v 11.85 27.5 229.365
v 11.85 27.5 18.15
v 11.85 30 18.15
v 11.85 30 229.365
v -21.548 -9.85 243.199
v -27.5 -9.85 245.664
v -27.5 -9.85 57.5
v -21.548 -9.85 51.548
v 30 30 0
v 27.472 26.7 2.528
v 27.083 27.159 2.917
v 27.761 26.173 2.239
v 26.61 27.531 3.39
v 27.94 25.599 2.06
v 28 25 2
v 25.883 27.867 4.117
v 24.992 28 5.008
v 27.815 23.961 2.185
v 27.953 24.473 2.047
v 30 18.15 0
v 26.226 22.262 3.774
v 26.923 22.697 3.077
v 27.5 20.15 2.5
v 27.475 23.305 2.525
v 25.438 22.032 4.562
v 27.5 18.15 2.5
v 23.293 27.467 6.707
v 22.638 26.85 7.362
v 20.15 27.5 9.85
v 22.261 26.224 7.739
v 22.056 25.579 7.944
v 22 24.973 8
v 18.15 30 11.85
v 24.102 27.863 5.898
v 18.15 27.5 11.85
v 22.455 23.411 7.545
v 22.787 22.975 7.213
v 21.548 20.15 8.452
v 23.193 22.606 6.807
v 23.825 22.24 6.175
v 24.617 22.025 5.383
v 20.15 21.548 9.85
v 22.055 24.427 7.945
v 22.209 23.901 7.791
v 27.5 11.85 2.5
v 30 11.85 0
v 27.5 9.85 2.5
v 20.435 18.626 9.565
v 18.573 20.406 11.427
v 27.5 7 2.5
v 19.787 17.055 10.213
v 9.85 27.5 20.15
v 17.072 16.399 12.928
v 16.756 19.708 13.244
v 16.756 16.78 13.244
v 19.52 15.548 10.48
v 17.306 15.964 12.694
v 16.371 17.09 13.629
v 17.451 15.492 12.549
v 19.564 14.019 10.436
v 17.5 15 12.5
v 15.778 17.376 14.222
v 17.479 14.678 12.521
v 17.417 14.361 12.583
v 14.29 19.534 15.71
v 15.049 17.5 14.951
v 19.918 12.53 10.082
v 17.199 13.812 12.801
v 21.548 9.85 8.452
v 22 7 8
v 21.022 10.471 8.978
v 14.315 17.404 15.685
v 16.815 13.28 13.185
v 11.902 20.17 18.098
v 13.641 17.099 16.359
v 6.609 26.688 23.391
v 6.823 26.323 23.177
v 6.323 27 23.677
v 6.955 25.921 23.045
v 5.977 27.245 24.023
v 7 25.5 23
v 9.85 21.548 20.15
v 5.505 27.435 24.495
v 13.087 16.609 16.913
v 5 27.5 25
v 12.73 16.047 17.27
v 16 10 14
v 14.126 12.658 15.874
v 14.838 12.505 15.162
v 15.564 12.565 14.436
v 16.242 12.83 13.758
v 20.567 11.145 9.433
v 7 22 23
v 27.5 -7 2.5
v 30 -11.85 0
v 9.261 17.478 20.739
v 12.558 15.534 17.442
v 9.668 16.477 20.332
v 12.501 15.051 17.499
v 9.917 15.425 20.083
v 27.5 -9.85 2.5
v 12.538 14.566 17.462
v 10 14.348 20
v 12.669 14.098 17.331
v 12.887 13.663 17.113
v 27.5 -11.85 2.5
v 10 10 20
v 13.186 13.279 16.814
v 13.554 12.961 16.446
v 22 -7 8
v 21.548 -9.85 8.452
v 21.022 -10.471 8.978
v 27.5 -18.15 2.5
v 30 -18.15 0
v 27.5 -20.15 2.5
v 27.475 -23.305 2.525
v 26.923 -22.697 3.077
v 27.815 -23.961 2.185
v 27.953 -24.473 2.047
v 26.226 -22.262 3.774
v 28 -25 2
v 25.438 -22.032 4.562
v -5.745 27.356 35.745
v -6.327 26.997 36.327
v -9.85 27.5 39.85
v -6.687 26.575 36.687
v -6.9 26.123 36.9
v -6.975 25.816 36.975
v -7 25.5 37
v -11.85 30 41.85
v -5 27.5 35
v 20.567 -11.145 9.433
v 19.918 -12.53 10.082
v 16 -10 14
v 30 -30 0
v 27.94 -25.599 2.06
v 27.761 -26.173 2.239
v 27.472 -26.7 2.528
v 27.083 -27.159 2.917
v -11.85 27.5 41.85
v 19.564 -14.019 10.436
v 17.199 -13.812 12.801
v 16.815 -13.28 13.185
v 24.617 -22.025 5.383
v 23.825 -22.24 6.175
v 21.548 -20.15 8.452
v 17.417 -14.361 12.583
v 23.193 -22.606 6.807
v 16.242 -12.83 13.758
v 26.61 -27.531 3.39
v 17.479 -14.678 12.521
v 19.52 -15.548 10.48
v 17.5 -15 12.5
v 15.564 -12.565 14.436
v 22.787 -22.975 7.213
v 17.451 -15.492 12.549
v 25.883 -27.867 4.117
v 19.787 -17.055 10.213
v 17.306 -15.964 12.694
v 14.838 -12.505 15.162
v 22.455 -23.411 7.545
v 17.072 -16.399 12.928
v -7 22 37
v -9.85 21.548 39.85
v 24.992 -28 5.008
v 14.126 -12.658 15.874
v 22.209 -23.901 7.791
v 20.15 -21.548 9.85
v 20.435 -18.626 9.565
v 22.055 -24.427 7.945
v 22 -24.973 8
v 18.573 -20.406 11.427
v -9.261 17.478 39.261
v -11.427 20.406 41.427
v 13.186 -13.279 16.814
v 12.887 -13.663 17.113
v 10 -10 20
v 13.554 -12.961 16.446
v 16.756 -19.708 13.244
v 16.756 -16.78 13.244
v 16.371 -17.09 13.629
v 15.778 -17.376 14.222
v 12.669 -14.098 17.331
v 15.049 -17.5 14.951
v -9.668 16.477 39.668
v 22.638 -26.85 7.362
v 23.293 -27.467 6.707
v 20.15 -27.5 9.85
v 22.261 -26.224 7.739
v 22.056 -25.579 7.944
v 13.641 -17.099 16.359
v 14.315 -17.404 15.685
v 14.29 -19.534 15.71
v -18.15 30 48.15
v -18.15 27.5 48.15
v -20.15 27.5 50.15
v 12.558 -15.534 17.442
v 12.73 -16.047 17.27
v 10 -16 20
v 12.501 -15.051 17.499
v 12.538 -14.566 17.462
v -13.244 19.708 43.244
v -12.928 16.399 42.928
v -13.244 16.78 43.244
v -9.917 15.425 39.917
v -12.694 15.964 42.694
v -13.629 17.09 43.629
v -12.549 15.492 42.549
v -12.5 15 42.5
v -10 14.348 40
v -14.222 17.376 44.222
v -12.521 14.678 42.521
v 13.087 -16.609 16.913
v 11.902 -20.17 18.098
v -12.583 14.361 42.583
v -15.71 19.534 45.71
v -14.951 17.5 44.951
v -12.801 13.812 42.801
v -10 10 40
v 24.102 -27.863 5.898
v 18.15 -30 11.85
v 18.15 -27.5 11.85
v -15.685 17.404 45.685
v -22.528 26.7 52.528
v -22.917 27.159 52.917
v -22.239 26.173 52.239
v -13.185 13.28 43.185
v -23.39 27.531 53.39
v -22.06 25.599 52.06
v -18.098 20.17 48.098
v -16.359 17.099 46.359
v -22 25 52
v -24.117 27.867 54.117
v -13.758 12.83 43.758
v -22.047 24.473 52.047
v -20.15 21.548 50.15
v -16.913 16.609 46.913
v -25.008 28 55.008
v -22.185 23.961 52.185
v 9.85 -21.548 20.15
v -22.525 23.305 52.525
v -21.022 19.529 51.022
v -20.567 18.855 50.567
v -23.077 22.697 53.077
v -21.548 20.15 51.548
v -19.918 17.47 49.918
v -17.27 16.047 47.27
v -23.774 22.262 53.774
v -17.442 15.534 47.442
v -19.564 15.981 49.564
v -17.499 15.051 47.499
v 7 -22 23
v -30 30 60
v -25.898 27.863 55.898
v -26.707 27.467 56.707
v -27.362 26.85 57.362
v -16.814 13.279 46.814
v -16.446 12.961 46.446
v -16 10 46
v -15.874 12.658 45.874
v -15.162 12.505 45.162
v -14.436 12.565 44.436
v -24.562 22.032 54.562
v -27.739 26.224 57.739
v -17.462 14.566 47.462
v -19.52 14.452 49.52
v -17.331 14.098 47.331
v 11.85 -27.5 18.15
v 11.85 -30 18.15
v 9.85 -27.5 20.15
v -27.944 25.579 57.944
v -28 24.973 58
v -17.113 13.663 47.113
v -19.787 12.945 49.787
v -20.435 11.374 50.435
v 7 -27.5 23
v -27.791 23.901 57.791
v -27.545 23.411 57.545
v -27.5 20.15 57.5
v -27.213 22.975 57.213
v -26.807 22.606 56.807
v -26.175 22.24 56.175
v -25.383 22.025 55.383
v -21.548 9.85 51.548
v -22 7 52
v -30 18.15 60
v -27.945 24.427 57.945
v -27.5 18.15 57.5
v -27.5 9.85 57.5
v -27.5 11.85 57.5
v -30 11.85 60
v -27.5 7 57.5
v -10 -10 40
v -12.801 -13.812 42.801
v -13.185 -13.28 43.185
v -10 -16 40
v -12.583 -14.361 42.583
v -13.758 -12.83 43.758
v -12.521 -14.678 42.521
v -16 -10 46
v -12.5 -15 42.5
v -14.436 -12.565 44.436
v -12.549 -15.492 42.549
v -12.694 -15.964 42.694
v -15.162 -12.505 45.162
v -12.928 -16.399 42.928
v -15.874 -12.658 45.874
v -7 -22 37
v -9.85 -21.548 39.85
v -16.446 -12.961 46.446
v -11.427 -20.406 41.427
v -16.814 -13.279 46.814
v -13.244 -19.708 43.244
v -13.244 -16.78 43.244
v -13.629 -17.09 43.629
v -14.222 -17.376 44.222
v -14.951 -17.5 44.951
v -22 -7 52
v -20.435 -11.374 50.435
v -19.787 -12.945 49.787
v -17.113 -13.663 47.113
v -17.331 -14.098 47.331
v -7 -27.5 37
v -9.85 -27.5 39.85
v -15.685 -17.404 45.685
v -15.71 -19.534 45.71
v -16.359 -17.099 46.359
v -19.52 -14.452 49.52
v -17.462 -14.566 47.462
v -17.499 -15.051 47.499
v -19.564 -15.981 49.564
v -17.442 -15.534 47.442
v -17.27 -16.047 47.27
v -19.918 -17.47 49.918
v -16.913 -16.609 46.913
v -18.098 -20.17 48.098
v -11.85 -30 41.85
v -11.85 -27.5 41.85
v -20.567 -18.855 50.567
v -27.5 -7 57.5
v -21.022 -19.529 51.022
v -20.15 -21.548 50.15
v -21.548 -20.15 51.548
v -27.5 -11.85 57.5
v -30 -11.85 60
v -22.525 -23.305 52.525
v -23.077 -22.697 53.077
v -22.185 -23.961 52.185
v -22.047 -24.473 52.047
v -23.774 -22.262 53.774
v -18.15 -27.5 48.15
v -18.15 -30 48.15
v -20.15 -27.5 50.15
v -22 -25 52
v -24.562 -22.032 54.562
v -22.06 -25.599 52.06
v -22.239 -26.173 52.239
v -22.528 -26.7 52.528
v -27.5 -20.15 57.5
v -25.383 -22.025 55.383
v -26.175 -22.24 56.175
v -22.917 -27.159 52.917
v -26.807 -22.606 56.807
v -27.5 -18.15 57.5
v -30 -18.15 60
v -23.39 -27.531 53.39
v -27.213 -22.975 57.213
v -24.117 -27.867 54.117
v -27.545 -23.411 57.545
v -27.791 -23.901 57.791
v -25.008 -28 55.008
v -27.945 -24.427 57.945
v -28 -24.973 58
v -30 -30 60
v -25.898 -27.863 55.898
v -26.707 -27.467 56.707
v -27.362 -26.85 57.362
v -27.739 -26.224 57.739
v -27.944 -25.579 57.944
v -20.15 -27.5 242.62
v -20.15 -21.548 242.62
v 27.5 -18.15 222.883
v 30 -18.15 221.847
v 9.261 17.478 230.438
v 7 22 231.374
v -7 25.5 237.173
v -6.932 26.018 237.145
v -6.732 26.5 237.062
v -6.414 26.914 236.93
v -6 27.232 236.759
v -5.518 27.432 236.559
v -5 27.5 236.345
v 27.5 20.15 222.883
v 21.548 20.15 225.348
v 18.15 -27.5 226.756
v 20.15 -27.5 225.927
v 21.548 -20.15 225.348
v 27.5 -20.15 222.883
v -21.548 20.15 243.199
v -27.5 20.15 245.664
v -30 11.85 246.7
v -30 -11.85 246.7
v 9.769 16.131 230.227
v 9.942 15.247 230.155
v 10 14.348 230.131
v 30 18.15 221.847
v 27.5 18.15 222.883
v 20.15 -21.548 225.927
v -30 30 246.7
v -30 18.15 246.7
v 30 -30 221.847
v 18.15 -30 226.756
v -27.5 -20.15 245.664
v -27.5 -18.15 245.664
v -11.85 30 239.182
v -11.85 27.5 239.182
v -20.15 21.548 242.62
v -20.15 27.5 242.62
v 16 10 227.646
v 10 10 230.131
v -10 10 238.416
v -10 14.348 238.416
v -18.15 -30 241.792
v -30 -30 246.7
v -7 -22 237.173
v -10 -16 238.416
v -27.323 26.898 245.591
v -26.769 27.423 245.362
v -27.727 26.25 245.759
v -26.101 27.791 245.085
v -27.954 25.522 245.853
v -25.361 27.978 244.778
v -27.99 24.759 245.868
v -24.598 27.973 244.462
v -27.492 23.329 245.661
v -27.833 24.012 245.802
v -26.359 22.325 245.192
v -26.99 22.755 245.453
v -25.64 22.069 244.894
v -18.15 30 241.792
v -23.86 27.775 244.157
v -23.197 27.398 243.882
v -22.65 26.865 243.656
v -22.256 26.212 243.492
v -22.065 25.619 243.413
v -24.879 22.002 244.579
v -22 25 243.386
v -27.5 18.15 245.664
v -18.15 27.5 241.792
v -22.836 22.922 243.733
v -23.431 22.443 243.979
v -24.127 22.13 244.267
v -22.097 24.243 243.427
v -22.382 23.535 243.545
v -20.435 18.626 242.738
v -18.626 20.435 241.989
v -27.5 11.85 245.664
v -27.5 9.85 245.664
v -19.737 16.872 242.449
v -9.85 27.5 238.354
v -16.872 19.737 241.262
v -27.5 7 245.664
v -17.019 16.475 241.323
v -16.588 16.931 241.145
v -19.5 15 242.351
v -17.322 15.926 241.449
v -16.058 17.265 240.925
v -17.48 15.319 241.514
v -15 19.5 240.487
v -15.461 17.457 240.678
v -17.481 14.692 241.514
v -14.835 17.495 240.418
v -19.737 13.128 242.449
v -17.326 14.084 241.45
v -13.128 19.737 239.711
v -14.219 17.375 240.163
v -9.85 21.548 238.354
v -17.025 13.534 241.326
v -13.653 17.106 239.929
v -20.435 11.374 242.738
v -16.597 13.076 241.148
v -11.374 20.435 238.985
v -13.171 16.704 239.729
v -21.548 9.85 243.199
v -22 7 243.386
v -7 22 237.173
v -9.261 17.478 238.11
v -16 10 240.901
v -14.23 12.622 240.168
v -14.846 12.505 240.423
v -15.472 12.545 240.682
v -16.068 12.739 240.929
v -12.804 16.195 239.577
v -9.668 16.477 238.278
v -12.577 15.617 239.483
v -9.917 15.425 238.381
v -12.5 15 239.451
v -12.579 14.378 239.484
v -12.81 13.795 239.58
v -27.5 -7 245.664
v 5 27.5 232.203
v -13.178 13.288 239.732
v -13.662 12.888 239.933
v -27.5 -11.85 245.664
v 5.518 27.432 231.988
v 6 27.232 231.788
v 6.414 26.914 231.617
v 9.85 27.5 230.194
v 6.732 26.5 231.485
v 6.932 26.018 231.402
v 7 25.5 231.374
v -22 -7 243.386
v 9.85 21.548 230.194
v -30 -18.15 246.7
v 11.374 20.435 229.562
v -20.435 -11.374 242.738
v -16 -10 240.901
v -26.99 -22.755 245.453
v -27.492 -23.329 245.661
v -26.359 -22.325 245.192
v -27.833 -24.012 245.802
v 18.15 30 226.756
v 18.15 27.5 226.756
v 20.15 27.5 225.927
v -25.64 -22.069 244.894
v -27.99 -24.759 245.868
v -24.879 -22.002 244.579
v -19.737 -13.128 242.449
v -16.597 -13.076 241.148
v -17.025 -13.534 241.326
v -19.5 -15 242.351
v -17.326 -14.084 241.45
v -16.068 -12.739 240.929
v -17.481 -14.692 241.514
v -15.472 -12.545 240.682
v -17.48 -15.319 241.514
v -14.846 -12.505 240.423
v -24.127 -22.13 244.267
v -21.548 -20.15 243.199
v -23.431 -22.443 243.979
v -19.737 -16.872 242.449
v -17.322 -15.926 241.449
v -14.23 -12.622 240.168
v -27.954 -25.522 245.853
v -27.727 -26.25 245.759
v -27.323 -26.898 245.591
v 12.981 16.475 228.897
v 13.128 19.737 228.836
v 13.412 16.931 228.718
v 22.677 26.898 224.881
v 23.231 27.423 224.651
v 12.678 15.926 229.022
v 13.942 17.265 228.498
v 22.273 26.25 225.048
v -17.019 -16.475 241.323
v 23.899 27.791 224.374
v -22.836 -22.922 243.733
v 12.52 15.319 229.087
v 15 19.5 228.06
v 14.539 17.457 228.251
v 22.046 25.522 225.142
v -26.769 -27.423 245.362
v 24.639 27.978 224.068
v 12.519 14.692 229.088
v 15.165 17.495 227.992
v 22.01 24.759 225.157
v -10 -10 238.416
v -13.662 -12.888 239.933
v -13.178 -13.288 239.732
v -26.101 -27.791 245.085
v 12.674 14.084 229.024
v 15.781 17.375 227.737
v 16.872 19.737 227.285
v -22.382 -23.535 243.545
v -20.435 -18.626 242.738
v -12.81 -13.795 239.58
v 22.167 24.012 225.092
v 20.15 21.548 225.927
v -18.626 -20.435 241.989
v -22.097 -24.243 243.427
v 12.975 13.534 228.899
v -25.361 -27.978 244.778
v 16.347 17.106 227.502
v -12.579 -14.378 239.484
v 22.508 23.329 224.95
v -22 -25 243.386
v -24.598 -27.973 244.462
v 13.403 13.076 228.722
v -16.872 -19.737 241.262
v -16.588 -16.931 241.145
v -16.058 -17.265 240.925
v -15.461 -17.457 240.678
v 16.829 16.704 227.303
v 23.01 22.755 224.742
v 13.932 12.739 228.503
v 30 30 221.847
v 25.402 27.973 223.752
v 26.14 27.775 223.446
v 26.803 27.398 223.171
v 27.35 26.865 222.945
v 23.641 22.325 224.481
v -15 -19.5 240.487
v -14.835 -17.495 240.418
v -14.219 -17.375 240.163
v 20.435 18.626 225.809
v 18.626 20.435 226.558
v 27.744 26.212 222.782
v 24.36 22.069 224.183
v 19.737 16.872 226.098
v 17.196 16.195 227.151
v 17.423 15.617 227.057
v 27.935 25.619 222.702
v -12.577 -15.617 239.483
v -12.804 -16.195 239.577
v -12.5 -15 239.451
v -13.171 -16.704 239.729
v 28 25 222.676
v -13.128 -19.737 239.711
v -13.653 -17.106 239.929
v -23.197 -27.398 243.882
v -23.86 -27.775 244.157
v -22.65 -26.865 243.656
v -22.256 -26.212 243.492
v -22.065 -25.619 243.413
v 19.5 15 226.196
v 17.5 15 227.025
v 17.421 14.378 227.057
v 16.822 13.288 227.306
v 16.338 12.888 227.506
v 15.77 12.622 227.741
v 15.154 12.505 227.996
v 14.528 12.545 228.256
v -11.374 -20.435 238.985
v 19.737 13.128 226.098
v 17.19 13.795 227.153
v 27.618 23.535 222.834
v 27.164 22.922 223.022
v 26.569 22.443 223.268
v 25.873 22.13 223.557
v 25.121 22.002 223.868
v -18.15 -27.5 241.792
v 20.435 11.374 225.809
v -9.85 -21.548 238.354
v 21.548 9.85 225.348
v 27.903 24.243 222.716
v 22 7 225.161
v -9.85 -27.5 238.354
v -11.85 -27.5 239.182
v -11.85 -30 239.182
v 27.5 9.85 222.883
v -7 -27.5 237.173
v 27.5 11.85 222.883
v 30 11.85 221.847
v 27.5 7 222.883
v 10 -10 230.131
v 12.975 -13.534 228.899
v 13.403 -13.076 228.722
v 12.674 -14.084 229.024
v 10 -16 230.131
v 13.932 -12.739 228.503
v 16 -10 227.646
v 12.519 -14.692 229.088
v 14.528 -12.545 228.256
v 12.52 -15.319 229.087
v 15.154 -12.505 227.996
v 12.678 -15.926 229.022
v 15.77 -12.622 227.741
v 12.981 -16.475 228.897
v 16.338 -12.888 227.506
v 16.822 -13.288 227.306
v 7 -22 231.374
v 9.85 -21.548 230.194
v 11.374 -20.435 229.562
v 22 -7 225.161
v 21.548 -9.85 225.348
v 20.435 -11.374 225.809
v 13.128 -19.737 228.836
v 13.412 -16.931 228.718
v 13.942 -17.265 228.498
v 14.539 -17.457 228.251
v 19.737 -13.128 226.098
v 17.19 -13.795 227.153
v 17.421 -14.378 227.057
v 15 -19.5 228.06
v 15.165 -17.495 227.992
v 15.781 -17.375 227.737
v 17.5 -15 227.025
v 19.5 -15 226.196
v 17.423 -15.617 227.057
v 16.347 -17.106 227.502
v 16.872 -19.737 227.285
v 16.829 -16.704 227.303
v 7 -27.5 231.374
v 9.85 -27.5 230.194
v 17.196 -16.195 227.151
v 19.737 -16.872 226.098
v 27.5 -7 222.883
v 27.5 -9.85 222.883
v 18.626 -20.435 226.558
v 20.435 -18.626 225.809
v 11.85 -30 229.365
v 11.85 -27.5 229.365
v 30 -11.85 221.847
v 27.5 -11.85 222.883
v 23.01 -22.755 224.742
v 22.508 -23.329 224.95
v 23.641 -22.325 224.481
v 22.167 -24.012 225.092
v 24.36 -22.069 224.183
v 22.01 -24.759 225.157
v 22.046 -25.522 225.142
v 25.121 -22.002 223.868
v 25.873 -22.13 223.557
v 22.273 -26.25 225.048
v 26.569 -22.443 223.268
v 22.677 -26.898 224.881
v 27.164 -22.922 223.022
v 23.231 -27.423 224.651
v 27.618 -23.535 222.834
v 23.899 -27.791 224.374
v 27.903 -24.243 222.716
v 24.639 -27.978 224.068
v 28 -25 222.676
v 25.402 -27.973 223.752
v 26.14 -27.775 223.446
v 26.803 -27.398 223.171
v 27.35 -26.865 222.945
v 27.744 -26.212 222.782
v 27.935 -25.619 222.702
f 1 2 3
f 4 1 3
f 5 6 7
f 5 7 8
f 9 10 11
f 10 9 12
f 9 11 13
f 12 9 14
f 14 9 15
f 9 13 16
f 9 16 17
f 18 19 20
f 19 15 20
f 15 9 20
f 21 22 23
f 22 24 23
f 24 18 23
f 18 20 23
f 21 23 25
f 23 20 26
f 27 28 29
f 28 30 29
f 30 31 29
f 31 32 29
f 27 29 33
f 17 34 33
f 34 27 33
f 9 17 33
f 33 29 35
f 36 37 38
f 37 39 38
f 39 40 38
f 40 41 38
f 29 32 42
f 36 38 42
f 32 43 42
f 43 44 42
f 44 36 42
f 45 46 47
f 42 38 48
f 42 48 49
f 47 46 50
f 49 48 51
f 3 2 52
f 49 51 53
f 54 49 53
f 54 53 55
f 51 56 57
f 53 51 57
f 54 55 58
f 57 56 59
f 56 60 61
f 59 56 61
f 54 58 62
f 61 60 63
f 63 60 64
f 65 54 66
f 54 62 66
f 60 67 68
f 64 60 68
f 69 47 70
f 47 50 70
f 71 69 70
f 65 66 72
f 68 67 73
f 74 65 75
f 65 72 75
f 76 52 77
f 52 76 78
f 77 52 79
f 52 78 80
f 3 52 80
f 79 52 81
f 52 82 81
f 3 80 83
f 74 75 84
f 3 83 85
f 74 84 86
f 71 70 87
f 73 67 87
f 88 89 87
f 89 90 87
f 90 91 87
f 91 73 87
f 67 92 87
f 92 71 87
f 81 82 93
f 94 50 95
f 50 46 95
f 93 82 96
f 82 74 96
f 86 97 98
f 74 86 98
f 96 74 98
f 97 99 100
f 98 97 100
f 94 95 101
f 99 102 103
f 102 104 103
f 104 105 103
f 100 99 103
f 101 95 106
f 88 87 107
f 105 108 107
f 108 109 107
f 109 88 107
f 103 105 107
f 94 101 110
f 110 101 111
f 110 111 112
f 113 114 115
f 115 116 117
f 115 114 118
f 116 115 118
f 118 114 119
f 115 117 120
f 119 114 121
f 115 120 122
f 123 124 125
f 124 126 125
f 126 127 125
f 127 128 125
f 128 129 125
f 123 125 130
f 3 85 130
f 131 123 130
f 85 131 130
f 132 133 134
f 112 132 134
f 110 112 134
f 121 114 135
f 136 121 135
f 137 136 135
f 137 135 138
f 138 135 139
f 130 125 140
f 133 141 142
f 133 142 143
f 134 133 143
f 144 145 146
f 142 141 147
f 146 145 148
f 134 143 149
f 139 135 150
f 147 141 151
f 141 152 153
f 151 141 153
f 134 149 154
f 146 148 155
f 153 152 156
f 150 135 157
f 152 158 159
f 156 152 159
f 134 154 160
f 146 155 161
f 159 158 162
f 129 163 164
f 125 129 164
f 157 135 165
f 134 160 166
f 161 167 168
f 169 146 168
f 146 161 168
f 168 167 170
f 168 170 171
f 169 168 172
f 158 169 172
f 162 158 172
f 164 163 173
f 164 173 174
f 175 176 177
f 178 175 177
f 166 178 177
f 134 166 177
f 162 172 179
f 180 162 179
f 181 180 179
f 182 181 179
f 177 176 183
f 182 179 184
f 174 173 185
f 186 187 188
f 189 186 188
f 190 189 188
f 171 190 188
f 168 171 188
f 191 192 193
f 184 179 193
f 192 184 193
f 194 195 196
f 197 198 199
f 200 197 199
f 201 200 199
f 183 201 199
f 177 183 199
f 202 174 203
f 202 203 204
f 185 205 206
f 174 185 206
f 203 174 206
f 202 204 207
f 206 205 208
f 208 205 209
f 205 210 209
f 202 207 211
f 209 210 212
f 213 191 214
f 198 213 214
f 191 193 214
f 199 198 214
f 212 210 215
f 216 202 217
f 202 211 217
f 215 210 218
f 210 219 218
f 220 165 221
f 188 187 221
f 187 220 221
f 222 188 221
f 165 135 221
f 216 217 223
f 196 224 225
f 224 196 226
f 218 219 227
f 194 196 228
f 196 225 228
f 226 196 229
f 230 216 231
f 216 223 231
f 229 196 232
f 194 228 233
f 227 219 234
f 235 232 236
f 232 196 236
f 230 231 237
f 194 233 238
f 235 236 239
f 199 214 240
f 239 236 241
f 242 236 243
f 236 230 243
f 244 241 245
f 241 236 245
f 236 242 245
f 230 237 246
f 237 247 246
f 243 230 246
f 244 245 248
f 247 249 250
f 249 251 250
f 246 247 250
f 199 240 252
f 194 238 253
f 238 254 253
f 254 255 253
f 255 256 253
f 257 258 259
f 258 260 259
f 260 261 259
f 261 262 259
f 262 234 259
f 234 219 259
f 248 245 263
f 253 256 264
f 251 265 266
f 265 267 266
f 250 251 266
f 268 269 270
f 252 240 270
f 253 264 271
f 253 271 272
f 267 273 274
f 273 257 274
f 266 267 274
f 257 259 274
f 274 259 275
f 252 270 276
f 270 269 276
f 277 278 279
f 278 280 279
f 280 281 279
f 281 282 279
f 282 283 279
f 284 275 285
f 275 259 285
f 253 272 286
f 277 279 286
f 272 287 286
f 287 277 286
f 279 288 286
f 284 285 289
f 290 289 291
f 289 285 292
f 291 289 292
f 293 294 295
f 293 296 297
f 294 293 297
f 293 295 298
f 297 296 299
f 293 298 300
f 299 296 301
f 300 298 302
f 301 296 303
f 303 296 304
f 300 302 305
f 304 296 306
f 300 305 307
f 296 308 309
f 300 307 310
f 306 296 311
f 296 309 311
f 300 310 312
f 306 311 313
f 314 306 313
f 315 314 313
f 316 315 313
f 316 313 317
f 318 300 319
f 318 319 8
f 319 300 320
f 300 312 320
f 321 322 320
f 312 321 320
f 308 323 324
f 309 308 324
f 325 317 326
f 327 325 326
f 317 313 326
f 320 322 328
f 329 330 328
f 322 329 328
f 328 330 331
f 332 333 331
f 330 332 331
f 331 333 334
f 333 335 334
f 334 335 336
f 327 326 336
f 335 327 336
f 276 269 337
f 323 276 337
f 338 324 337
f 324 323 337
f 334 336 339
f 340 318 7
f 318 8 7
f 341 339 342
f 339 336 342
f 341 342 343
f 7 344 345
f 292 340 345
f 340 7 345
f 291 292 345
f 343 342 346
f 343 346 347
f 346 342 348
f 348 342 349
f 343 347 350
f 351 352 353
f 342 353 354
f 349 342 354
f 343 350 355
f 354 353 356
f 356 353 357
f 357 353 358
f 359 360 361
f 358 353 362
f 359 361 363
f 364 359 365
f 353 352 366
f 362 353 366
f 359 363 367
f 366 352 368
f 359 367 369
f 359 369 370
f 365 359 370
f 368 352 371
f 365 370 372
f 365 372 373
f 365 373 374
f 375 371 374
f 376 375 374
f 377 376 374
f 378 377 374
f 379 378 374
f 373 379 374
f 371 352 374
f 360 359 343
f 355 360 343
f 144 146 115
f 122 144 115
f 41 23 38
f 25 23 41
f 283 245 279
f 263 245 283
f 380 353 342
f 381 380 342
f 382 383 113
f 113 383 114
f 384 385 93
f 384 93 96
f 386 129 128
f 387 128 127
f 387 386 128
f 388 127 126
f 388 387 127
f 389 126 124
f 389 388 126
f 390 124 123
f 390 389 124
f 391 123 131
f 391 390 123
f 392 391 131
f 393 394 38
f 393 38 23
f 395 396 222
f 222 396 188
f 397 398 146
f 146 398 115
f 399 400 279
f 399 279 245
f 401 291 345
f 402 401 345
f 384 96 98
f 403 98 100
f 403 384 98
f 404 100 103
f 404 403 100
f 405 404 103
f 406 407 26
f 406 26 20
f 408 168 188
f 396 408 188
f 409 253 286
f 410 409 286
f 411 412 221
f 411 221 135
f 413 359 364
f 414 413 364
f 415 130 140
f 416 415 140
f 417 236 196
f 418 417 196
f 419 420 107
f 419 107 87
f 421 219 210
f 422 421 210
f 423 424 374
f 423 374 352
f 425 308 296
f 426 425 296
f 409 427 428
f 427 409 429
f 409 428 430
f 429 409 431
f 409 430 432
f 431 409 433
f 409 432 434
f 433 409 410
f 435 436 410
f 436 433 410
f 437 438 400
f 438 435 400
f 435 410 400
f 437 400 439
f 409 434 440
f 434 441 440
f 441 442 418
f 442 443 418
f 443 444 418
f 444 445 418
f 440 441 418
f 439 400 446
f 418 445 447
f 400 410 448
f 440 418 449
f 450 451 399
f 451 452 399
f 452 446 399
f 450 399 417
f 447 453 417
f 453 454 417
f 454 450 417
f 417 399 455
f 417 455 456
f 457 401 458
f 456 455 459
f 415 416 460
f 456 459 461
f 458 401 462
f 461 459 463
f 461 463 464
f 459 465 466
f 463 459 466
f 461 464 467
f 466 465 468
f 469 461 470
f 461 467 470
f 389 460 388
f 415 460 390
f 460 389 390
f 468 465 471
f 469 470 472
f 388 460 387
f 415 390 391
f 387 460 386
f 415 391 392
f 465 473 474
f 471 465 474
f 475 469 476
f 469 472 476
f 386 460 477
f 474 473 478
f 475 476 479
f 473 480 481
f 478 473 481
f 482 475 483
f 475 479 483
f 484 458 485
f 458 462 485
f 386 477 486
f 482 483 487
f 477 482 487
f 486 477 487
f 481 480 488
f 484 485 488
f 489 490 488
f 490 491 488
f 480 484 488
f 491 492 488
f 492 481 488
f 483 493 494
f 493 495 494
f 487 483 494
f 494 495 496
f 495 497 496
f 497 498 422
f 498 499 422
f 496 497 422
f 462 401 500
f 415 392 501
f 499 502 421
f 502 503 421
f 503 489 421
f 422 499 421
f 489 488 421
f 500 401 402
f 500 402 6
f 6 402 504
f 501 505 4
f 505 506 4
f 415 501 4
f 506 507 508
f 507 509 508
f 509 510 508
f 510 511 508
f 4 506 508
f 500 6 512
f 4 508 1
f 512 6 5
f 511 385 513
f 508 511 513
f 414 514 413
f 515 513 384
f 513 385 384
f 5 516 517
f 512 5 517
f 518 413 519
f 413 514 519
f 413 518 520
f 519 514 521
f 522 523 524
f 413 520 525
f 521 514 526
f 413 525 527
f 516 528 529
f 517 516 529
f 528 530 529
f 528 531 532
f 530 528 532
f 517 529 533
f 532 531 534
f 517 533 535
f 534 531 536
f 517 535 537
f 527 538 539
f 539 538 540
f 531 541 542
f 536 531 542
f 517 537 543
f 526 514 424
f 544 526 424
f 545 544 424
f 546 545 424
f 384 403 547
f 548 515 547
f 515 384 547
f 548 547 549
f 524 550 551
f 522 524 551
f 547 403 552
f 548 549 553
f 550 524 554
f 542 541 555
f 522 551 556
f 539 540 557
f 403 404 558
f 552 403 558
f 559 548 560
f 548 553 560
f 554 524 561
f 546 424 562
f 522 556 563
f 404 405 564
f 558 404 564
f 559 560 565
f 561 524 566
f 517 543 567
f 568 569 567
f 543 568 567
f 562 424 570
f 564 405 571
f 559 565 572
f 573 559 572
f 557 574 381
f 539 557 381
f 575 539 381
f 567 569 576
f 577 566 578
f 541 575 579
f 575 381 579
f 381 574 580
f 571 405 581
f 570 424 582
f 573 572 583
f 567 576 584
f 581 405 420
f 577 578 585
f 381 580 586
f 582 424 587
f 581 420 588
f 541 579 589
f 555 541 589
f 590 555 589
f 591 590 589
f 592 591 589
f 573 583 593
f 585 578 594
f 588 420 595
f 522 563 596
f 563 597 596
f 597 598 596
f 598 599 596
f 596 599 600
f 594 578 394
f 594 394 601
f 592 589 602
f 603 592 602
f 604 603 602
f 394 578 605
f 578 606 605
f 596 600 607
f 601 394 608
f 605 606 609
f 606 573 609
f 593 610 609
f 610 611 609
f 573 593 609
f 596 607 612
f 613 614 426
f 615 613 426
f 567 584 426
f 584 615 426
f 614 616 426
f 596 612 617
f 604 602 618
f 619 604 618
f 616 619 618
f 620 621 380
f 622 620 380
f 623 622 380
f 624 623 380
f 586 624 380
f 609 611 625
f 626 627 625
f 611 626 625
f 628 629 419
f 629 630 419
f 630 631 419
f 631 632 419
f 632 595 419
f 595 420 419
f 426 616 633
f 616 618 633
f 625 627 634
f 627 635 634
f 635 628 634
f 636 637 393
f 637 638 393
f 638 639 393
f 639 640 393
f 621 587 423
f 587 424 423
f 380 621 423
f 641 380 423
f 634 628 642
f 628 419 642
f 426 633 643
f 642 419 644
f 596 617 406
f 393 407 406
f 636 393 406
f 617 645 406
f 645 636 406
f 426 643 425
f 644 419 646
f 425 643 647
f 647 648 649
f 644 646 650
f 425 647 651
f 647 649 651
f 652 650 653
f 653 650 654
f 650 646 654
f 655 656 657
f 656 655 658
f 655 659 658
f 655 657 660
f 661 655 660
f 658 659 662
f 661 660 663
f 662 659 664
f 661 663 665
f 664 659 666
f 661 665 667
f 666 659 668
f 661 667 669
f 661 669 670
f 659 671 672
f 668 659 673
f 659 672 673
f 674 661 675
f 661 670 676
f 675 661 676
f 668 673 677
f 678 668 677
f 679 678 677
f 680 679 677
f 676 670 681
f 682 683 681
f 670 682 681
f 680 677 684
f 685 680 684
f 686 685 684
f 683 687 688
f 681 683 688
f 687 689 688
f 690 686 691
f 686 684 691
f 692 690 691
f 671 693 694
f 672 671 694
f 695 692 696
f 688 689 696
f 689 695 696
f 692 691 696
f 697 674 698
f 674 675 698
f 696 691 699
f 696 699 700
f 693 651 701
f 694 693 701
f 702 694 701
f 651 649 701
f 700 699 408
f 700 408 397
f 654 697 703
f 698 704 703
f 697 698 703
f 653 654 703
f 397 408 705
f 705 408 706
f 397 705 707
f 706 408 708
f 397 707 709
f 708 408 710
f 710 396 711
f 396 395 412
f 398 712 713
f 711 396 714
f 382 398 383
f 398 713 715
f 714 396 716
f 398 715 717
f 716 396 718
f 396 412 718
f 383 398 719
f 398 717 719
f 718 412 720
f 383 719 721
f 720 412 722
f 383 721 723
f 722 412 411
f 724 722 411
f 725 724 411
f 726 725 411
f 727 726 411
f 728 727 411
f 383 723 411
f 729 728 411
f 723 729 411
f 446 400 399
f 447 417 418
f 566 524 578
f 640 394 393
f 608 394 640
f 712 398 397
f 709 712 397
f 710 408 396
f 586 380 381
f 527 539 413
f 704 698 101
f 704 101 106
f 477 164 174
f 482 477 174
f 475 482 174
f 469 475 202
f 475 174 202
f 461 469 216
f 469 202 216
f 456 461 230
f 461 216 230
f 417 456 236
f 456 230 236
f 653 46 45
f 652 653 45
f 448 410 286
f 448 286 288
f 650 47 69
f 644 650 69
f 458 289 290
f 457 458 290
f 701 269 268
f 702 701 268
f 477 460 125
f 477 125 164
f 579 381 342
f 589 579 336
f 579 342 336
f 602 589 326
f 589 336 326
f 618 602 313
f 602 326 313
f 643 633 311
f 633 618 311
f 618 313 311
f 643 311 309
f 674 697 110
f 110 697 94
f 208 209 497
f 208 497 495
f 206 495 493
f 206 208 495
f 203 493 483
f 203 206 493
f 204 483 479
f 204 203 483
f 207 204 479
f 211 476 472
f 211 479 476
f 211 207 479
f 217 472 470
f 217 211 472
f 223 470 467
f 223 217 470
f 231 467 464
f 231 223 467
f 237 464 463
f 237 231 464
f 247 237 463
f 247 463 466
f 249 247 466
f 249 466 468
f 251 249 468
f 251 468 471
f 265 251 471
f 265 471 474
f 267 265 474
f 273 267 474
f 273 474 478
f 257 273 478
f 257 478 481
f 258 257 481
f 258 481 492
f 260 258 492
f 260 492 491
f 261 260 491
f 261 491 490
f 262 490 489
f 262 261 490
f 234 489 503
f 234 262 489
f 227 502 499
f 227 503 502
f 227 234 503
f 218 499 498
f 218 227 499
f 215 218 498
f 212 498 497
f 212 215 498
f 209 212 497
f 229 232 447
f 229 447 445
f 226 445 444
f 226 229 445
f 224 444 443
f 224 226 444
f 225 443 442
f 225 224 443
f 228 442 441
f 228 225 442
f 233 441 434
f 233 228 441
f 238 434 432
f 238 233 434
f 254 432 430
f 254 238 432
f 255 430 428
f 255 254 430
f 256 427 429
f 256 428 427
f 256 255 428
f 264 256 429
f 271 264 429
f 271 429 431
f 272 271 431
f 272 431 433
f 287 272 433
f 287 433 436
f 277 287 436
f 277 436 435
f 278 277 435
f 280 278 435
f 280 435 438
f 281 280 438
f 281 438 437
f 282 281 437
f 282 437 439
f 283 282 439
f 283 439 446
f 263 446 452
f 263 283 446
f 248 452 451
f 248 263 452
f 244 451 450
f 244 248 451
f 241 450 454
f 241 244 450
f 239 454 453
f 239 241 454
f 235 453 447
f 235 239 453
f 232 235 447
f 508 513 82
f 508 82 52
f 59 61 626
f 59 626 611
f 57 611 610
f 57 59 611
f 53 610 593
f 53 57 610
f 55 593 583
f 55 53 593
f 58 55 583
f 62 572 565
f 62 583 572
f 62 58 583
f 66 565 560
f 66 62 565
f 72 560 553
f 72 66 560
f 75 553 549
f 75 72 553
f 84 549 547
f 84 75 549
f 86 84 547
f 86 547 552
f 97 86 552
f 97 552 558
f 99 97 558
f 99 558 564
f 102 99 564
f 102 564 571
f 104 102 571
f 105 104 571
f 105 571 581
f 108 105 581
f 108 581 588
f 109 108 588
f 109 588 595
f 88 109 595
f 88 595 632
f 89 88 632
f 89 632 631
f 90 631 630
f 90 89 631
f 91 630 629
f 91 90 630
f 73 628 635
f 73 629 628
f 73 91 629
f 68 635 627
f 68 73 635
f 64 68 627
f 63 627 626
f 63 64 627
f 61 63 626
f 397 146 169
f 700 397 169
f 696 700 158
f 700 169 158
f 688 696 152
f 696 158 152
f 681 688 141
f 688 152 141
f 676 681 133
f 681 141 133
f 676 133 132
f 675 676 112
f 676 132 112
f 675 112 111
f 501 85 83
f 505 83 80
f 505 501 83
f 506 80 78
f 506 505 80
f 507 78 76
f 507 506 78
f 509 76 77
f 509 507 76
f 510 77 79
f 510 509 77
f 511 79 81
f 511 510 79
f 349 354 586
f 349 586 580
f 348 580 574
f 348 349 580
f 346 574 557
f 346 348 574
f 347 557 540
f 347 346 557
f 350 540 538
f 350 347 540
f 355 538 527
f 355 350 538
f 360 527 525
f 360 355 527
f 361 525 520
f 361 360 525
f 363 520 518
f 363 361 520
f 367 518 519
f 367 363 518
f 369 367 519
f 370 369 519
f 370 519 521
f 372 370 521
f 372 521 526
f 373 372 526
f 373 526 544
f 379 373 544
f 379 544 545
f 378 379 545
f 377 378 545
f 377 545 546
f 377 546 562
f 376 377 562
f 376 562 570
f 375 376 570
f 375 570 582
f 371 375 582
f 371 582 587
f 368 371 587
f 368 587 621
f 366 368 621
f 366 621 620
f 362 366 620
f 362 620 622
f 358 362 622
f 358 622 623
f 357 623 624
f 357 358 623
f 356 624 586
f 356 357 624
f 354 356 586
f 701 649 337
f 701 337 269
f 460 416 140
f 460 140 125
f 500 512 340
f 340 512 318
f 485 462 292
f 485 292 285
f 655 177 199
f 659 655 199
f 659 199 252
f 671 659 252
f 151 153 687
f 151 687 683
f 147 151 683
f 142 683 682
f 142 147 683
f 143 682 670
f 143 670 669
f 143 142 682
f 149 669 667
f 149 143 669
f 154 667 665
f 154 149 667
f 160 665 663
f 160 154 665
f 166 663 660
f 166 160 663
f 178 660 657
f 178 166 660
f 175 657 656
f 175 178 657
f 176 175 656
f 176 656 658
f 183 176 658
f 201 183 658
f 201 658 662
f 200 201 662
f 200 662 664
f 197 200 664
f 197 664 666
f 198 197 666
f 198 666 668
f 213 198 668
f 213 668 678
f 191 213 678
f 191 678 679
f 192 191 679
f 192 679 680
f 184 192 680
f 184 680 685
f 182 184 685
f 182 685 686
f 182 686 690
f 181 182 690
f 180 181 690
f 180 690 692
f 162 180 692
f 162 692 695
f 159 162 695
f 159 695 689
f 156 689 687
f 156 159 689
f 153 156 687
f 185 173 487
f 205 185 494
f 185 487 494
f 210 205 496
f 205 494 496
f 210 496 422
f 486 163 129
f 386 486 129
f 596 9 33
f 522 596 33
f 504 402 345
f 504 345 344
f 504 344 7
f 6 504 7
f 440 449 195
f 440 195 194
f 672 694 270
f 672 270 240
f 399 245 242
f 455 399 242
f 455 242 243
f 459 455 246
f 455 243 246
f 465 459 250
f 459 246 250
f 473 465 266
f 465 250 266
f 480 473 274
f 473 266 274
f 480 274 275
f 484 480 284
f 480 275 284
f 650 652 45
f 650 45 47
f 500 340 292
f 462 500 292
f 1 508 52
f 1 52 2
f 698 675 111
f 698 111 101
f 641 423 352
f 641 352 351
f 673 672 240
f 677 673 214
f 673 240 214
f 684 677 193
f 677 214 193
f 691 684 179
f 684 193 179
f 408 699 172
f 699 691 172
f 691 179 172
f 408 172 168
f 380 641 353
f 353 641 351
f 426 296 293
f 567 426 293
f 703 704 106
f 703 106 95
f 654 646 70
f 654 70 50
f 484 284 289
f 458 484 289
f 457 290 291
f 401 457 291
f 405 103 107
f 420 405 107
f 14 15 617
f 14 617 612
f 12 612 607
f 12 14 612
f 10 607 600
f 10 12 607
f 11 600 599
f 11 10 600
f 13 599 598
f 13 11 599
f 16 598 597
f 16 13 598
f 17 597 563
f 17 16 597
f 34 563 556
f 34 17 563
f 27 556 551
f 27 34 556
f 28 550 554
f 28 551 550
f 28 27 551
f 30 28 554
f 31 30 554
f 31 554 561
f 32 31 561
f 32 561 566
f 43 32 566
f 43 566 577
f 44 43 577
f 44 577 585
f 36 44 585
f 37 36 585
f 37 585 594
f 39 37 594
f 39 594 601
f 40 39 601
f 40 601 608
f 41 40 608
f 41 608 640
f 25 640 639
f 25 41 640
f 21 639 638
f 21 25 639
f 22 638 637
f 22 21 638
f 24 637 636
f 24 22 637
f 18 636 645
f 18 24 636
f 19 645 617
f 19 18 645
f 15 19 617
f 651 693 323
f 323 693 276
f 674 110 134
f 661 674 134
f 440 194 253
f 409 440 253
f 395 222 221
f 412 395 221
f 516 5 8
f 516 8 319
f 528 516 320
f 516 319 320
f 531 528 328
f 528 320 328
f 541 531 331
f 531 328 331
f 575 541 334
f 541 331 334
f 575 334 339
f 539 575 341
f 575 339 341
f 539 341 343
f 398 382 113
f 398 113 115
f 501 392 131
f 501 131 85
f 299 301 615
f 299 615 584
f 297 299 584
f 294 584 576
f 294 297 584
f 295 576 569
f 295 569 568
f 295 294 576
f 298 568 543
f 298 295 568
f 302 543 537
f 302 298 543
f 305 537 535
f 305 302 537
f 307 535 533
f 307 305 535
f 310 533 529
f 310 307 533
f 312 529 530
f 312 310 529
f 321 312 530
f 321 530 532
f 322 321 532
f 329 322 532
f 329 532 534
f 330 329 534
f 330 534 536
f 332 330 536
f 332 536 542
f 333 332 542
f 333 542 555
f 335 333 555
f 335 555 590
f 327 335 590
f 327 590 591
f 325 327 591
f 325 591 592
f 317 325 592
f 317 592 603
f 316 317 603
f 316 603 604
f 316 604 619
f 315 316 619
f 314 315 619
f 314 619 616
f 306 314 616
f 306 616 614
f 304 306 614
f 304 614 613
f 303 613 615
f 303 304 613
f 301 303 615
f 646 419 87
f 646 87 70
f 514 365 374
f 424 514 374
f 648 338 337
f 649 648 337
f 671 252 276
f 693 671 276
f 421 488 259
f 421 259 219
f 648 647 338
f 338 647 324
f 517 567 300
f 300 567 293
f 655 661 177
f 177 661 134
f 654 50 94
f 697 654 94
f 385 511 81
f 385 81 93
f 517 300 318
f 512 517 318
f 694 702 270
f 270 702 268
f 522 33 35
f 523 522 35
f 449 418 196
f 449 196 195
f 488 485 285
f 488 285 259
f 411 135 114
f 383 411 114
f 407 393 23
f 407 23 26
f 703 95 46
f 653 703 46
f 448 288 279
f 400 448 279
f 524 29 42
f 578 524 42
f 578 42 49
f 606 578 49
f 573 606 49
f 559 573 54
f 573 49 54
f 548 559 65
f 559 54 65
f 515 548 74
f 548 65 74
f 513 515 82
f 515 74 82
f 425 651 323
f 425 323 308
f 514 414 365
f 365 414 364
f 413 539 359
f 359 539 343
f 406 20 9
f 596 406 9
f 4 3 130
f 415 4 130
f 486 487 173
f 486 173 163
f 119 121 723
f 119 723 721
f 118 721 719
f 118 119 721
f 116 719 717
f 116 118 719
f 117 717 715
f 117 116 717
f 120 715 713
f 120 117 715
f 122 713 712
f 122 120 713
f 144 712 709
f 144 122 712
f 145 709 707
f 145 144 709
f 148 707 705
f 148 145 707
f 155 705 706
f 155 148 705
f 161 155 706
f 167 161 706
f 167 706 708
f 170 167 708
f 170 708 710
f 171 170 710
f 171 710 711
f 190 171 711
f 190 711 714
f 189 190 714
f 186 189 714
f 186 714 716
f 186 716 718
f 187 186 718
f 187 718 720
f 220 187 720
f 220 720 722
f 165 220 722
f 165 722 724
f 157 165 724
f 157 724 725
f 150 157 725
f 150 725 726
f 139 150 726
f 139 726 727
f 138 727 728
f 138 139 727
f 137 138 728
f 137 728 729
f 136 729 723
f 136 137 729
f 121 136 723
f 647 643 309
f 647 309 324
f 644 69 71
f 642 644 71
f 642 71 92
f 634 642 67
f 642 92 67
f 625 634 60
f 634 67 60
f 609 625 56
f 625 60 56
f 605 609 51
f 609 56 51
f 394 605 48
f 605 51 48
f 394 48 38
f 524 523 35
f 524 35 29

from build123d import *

# Parameters (mm, degrees)
F0_R          = 3
F0_R_2        = 2.5
F1_DEPTH      = 246.7
F2_R          = 2
F3_R          = 7
F6_DEPTH      = 30
F6_DEPTH_BACK = 30


# Not quite as in the source:
# - a feature names something its author has since deleted; it is built from what else it names


with BuildPart() as f1:
    # F0 (on Top) → F1 (new body)
    with BuildSketch(Plane.XY):
        with BuildLine():
            Line((18.15, -30), (30, -30))
            Line((30, -30), (30, -18.15))
            Line((30, -18.15), (27.5, -18.15))
            Line((27.5, -18.15), (27.5, -20.15))
            Line((27.5, -20.15), (21.5477069044, -20.15))
            ThreePointArc((21.5477069044, -20.15), (19.5, -15), (21.5477069044, -9.85))
            Line((21.5477069044, -9.85), (27.5, -9.85))
            Line((27.5, -9.85), (27.5, -11.85))
            Line((27.5, -11.85), (30, -11.85))
            Line((30, -11.85), (30, 11.85))
            Line((30, 11.85), (27.5, 11.85))
            Line((27.5, 11.85), (27.5, 9.85))
            Line((27.5, 9.85), (21.5477069044, 9.85))
            ThreePointArc((21.5477069044, 9.85), (19.5, 15), (21.5477069044, 20.15))
            Line((21.5477069044, 20.15), (27.5, 20.15))
            Line((27.5, 20.15), (27.5, 18.15))
            Line((27.5, 18.15), (30, 18.15))
            Line((30, 18.15), (30, 30))
            Line((30, 30), (18.15, 30))
            Line((18.15, 30), (18.15, 27.5))
            Line((18.15, 27.5), (20.15, 27.5))
            Line((20.15, 27.5), (20.15, 21.5477069044))
            ThreePointArc((20.15, 21.5477069044), (15, 19.5), (9.85, 21.5477069044))
            Line((9.85, 21.5477069044), (9.85, 27.5))
            Line((9.85, 27.5), (11.85, 27.5))
            Line((11.85, 27.5), (11.85, 30))
            Line((11.85, 30), (-11.85, 30))
            Line((-11.85, 30), (-11.85, 27.5))
            Line((-11.85, 27.5), (-9.85, 27.5))
            Line((-9.85, 27.5), (-9.85, 21.5477069044))
            ThreePointArc((-9.85, 21.5477069044), (-15, 19.5), (-20.15, 21.5477069044))
            Line((-20.15, 21.5477069044), (-20.15, 27.5))
            Line((-20.15, 27.5), (-18.15, 27.5))
            Line((-18.15, 27.5), (-18.15, 30))
            Line((-18.15, 30), (-30, 30))
            Line((-30, 30), (-30, 18.15))
            Line((-30, 18.15), (-27.5, 18.15))
            Line((-27.5, 18.15), (-27.5, 20.15))
            Line((-27.5, 20.15), (-21.5477069044, 20.15))
            ThreePointArc((-21.5477069044, 20.15), (-19.5, 15), (-21.5477069044, 9.85))
            Line((-21.5477069044, 9.85), (-27.5, 9.85))
            Line((-27.5, 9.85), (-27.5, 11.85))
            Line((-27.5, 11.85), (-30, 11.85))
            Line((-30, 11.85), (-30, -11.85))
            Line((-30, -11.85), (-27.5, -11.85))
            Line((-27.5, -11.85), (-27.5, -9.85))
            Line((-27.5, -9.85), (-21.5477069044, -9.85))
            ThreePointArc((-21.5477069044, -9.85), (-19.5, -15), (-21.5477069044, -20.15))
            Line((-21.5477069044, -20.15), (-27.5, -20.15))
            Line((-27.5, -20.15), (-27.5, -18.15))
            Line((-27.5, -18.15), (-30, -18.15))
            Line((-30, -18.15), (-30, -30))
            Line((-30, -30), (-18.15, -30))
            Line((-18.15, -30), (-18.15, -27.5))
            Line((-18.15, -27.5), (-20.15, -27.5))
            Line((-20.15, -27.5), (-20.15, -21.5477069044))
            ThreePointArc((-20.15, -21.5477069044), (-15, -19.5), (-9.85, -21.5477069044))
            Line((-9.85, -21.5477069044), (-9.85, -27.5))
            Line((-9.85, -27.5), (-11.85, -27.5))
            Line((-11.85, -27.5), (-11.85, -30))
            Line((-11.85, -30), (11.85, -30))
            Line((11.85, -30), (11.85, -27.5))
            Line((11.85, -27.5), (9.85, -27.5))
            Line((9.85, -27.5), (9.85, -21.5477069044))
            ThreePointArc((9.85, -21.5477069044), (15, -19.5), (20.15, -21.5477069044))
            Line((20.15, -21.5477069044), (20.15, -27.5))
            Line((20.15, -27.5), (18.15, -27.5))
            Line((18.15, -27.5), (18.15, -30))
        make_face()
        with Locations((-25, -25)):
            Circle(F0_R, mode=Mode.SUBTRACT)
        with Locations((-15, -15)):
            Circle(F0_R_2, mode=Mode.SUBTRACT)
        with Locations((25, -25)):
            Circle(F0_R, mode=Mode.SUBTRACT)
        with Locations((15, -15)):
            Circle(F0_R_2, mode=Mode.SUBTRACT)
        with Locations((-25, 25)):
            Circle(F0_R, mode=Mode.SUBTRACT)
        with Locations((-15, 15)):
            Circle(F0_R_2, mode=Mode.SUBTRACT)
        Polygon((-7, 22), (-7, 27.5), (0, 27.5), (7, 27.5), (7, 22), (10, 16), (10, 10), (16, 10), (22, 7), (27.5, 7), (27.5, 0), (27.5, -7), (22, -7), (16, -10), (10, -10), (10, -16), (7, -22), (7, -27.5), (0, -27.5), (-7, -27.5), (-7, -22), (-10, -16), (-10, -10), (-16, -10), (-22, -7), (-27.5, -7), (-27.5, 0), (-27.5, 7), (-22, 7), (-16, 10), (-10, 10), (-10, 16), align=None, mode=Mode.SUBTRACT)
        with Locations((15, 15)):
            Circle(F0_R_2, mode=Mode.SUBTRACT)
        with Locations((25, 25)):
            Circle(F0_R, mode=Mode.SUBTRACT)
    extrude(amount=F1_DEPTH)

    # F2
    f2_edges = [f1.edges().sort_by_distance(p)[0] for p in [
        (-7, 27.5, 123.35),
        (7, 27.5, 123.35),
    ]]
    fillet(f2_edges, radius=F2_R)

    # F3
    f3_edges = [f1.edges().sort_by_distance(p)[0] for p in [
        (-10, 16, 123.35),
        (10, 16, 123.35),
    ]]
    fillet(f3_edges, radius=F3_R)

    # F5 (on Front) → F6 (cut, two sides)
    with BuildSketch(Plane.XZ) as f6_sk:
        Polygon((-21.4844248466, -51.4844248466), (30, 0), (-30.7442165391, 60.7442165391), (-82.2286413857, 9.2597916926), align=None)
        Polygon((69.921577374, 205.311127478), (91.4664718921, 257.3251040235), (-8.4551054819, 298.7139765456), (-30, 246.7), align=None)
    extrude(amount=F6_DEPTH, mode=Mode.SUBTRACT)
    extrude(f6_sk.sketch, amount=-F6_DEPTH_BACK, mode=Mode.SUBTRACT)


solid = f1.part
